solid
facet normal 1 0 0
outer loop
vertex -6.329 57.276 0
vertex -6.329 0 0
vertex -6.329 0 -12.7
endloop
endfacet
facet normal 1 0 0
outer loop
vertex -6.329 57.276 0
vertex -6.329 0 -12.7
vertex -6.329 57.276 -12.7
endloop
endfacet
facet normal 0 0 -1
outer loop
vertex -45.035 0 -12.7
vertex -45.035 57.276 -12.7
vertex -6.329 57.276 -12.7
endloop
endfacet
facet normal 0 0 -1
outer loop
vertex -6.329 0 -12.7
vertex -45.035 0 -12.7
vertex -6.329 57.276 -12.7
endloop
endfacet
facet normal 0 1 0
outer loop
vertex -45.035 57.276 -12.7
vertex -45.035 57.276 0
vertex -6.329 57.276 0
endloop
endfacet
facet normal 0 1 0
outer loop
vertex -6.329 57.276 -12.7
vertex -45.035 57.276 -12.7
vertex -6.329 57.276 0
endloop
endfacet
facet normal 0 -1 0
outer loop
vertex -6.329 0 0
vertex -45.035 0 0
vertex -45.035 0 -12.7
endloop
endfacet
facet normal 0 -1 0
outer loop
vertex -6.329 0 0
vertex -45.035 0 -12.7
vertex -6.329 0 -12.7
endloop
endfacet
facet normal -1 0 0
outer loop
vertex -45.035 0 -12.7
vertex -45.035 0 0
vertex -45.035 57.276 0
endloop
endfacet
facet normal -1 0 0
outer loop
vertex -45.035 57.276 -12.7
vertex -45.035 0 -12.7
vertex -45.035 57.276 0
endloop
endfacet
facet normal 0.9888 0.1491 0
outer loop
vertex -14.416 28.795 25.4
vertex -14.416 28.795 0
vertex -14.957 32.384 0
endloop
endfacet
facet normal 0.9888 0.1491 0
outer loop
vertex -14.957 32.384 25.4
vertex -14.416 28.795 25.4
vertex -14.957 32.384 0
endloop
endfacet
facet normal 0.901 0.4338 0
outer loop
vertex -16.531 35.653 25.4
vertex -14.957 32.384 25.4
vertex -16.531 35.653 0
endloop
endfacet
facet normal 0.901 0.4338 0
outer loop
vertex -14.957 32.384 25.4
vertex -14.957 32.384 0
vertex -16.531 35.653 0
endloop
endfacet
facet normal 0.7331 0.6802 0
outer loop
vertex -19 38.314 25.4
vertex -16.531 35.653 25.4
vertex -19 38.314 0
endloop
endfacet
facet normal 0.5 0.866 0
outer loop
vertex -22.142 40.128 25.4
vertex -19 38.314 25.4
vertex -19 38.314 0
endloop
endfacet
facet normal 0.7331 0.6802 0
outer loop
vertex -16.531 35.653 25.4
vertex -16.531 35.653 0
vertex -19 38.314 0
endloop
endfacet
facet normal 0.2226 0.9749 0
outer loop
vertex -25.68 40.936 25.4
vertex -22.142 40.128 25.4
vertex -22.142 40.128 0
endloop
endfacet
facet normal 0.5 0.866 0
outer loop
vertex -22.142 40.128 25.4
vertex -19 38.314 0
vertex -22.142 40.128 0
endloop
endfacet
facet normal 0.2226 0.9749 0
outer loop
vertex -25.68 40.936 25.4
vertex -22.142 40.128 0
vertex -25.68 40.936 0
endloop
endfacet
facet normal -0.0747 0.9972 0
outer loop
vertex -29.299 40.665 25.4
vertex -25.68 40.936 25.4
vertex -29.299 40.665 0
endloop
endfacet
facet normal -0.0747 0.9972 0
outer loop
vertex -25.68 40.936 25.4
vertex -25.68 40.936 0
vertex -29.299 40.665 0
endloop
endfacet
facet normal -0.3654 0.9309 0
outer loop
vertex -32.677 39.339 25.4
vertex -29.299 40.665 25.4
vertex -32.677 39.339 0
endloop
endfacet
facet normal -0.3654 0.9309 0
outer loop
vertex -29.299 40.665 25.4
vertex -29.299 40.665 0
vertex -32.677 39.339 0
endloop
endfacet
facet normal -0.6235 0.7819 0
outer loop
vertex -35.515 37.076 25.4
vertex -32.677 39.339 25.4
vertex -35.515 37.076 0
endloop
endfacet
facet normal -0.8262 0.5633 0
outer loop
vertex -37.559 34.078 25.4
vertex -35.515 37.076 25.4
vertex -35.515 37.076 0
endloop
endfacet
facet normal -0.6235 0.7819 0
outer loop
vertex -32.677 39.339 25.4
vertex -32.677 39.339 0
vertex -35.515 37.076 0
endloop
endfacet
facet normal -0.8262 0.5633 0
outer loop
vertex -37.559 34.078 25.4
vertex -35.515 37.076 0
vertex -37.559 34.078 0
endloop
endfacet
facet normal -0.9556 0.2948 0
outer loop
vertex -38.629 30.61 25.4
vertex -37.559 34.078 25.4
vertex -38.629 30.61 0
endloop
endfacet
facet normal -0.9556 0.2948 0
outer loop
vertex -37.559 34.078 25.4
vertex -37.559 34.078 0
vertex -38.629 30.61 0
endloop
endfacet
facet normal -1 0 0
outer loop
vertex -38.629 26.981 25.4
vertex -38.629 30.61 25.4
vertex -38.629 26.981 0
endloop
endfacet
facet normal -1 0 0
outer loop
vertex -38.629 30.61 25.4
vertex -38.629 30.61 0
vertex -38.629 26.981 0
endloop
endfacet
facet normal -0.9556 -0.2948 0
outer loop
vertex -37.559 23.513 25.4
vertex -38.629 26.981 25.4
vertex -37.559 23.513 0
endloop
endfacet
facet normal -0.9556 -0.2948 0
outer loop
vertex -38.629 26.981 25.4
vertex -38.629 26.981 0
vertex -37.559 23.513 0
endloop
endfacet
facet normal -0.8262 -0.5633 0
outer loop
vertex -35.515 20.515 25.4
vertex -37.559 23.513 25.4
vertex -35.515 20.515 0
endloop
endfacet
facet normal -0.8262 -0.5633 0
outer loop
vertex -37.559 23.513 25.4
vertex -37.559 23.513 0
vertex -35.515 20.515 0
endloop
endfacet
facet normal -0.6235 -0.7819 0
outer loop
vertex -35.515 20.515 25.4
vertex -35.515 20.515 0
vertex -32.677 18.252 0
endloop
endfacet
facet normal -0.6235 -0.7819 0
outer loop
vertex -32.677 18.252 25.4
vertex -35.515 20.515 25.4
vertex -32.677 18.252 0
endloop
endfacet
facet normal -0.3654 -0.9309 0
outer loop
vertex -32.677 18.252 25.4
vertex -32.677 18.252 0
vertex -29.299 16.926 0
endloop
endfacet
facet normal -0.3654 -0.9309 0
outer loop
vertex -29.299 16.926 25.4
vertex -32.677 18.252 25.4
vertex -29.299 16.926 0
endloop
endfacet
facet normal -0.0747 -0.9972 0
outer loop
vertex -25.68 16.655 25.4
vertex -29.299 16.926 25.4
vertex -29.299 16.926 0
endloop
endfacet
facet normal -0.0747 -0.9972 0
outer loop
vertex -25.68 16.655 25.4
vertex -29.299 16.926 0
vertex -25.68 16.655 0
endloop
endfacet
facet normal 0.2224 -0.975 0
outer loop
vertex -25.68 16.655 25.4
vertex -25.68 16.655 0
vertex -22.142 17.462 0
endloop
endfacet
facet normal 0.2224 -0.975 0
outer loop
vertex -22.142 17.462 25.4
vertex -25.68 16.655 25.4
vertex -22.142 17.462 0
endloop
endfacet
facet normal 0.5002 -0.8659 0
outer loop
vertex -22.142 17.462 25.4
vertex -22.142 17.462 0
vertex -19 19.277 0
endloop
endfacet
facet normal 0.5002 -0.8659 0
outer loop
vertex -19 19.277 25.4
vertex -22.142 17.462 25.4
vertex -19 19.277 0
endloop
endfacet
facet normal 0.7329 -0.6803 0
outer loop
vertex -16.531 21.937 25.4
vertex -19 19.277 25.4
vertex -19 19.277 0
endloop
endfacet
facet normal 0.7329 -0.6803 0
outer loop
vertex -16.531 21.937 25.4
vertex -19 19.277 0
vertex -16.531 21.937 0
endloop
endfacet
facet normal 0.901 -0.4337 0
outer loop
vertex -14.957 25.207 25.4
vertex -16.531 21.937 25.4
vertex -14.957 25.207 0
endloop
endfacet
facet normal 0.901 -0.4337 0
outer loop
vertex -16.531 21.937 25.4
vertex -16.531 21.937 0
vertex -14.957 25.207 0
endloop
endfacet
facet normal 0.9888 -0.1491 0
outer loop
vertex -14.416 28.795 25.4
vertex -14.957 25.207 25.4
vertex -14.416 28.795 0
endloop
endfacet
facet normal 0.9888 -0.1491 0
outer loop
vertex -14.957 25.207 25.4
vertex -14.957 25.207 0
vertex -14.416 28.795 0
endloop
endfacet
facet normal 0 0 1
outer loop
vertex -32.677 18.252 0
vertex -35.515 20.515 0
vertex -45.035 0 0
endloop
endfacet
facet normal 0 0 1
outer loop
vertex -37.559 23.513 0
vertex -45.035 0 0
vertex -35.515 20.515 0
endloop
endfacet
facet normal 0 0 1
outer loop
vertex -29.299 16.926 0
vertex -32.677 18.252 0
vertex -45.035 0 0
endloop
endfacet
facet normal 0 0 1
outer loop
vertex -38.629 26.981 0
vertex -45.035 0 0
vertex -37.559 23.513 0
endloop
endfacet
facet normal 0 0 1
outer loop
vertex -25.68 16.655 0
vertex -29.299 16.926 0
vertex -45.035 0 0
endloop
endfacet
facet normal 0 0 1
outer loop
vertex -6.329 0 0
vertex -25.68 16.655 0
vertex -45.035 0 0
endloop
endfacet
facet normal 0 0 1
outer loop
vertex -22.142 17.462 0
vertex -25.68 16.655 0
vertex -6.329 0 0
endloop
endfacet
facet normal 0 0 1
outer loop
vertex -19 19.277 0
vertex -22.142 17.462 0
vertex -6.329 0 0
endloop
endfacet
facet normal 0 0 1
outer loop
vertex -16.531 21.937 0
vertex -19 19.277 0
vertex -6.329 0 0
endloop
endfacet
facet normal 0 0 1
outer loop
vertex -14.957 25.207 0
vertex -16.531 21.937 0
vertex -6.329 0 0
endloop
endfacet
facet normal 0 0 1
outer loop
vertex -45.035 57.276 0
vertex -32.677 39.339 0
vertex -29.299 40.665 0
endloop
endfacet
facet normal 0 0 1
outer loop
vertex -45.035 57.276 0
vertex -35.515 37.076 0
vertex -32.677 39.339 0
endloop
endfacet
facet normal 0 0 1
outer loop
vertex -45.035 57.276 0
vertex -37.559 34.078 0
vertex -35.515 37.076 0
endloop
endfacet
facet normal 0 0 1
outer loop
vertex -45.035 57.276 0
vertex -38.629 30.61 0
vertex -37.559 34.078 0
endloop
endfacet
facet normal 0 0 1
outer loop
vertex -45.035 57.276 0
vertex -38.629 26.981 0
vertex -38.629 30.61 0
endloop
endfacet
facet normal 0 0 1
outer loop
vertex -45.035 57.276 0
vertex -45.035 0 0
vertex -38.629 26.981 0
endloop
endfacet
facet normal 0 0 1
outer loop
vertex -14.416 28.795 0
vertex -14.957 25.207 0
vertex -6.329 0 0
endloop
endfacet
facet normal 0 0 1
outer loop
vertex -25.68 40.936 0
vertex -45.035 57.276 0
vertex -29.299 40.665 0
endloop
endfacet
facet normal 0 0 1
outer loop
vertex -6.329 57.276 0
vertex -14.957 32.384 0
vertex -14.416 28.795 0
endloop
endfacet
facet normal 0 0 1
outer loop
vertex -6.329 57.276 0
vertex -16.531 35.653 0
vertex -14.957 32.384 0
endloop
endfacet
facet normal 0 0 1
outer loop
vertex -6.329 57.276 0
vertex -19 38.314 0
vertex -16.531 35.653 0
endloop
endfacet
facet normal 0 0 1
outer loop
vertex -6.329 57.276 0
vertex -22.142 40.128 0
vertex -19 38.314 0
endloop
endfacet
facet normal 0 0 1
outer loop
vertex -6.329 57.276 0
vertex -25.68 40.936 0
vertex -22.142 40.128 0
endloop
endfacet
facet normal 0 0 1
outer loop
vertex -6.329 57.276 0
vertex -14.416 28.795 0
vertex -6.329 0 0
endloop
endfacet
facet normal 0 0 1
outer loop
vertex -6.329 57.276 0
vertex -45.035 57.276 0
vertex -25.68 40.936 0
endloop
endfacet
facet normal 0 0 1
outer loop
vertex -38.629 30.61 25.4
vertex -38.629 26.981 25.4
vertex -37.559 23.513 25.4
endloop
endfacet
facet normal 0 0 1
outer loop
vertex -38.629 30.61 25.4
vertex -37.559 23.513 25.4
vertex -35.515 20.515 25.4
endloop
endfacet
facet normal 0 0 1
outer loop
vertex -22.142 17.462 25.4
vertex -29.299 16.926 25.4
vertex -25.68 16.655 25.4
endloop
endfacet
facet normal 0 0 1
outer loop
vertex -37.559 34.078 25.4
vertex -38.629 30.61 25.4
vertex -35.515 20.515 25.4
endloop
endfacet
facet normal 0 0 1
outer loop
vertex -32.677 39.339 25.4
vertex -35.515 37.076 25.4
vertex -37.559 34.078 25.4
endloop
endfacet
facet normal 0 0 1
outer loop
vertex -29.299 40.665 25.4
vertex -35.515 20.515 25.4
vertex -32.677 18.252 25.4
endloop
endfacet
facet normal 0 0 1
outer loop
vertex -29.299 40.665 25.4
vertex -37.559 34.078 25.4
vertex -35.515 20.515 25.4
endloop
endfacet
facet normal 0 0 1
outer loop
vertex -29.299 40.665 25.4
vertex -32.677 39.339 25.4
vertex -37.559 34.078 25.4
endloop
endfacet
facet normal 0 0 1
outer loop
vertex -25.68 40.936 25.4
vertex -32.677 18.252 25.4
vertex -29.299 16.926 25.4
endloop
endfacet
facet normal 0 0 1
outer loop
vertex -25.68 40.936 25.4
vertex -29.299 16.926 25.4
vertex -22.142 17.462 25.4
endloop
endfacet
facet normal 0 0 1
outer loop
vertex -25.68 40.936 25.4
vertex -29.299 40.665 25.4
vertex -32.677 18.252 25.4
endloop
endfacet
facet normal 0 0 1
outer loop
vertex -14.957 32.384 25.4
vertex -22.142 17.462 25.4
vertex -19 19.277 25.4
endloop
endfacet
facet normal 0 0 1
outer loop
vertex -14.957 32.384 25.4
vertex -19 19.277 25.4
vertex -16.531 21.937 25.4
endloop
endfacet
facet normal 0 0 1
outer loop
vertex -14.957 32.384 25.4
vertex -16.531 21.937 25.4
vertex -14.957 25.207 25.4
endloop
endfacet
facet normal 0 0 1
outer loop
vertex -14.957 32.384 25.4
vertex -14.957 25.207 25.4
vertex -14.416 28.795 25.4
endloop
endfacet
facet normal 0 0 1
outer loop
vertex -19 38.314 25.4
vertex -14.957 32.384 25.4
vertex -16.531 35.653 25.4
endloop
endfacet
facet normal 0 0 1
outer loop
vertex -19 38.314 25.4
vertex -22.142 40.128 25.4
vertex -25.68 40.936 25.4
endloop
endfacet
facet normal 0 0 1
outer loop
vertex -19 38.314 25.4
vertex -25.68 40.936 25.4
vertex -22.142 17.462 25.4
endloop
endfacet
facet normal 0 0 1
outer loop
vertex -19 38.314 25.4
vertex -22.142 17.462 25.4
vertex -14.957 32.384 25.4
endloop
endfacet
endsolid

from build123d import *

# Parameters (mm, degrees)
F0_W     = 38.70645
F0_H     = 57.275925
F1_DEPTH = 12.7
F2_R     = 12.174497
F3_DEPTH = 25.4


with BuildPart() as f1:
    # F0 (on Top) → F1 (new body)
    with BuildSketch(Plane.XY):
        with Locations((-25.682018, 28.637963)):
            Rectangle(F0_W, F0_H)
    extrude(amount=-F1_DEPTH)

    # F2 (on face) → F3 (join)
    with BuildSketch(Plane.XY):
        with Locations((-26.59025, 28.795289)):
            Circle(F2_R)
    extrude(amount=F3_DEPTH)


solid = f1.part
